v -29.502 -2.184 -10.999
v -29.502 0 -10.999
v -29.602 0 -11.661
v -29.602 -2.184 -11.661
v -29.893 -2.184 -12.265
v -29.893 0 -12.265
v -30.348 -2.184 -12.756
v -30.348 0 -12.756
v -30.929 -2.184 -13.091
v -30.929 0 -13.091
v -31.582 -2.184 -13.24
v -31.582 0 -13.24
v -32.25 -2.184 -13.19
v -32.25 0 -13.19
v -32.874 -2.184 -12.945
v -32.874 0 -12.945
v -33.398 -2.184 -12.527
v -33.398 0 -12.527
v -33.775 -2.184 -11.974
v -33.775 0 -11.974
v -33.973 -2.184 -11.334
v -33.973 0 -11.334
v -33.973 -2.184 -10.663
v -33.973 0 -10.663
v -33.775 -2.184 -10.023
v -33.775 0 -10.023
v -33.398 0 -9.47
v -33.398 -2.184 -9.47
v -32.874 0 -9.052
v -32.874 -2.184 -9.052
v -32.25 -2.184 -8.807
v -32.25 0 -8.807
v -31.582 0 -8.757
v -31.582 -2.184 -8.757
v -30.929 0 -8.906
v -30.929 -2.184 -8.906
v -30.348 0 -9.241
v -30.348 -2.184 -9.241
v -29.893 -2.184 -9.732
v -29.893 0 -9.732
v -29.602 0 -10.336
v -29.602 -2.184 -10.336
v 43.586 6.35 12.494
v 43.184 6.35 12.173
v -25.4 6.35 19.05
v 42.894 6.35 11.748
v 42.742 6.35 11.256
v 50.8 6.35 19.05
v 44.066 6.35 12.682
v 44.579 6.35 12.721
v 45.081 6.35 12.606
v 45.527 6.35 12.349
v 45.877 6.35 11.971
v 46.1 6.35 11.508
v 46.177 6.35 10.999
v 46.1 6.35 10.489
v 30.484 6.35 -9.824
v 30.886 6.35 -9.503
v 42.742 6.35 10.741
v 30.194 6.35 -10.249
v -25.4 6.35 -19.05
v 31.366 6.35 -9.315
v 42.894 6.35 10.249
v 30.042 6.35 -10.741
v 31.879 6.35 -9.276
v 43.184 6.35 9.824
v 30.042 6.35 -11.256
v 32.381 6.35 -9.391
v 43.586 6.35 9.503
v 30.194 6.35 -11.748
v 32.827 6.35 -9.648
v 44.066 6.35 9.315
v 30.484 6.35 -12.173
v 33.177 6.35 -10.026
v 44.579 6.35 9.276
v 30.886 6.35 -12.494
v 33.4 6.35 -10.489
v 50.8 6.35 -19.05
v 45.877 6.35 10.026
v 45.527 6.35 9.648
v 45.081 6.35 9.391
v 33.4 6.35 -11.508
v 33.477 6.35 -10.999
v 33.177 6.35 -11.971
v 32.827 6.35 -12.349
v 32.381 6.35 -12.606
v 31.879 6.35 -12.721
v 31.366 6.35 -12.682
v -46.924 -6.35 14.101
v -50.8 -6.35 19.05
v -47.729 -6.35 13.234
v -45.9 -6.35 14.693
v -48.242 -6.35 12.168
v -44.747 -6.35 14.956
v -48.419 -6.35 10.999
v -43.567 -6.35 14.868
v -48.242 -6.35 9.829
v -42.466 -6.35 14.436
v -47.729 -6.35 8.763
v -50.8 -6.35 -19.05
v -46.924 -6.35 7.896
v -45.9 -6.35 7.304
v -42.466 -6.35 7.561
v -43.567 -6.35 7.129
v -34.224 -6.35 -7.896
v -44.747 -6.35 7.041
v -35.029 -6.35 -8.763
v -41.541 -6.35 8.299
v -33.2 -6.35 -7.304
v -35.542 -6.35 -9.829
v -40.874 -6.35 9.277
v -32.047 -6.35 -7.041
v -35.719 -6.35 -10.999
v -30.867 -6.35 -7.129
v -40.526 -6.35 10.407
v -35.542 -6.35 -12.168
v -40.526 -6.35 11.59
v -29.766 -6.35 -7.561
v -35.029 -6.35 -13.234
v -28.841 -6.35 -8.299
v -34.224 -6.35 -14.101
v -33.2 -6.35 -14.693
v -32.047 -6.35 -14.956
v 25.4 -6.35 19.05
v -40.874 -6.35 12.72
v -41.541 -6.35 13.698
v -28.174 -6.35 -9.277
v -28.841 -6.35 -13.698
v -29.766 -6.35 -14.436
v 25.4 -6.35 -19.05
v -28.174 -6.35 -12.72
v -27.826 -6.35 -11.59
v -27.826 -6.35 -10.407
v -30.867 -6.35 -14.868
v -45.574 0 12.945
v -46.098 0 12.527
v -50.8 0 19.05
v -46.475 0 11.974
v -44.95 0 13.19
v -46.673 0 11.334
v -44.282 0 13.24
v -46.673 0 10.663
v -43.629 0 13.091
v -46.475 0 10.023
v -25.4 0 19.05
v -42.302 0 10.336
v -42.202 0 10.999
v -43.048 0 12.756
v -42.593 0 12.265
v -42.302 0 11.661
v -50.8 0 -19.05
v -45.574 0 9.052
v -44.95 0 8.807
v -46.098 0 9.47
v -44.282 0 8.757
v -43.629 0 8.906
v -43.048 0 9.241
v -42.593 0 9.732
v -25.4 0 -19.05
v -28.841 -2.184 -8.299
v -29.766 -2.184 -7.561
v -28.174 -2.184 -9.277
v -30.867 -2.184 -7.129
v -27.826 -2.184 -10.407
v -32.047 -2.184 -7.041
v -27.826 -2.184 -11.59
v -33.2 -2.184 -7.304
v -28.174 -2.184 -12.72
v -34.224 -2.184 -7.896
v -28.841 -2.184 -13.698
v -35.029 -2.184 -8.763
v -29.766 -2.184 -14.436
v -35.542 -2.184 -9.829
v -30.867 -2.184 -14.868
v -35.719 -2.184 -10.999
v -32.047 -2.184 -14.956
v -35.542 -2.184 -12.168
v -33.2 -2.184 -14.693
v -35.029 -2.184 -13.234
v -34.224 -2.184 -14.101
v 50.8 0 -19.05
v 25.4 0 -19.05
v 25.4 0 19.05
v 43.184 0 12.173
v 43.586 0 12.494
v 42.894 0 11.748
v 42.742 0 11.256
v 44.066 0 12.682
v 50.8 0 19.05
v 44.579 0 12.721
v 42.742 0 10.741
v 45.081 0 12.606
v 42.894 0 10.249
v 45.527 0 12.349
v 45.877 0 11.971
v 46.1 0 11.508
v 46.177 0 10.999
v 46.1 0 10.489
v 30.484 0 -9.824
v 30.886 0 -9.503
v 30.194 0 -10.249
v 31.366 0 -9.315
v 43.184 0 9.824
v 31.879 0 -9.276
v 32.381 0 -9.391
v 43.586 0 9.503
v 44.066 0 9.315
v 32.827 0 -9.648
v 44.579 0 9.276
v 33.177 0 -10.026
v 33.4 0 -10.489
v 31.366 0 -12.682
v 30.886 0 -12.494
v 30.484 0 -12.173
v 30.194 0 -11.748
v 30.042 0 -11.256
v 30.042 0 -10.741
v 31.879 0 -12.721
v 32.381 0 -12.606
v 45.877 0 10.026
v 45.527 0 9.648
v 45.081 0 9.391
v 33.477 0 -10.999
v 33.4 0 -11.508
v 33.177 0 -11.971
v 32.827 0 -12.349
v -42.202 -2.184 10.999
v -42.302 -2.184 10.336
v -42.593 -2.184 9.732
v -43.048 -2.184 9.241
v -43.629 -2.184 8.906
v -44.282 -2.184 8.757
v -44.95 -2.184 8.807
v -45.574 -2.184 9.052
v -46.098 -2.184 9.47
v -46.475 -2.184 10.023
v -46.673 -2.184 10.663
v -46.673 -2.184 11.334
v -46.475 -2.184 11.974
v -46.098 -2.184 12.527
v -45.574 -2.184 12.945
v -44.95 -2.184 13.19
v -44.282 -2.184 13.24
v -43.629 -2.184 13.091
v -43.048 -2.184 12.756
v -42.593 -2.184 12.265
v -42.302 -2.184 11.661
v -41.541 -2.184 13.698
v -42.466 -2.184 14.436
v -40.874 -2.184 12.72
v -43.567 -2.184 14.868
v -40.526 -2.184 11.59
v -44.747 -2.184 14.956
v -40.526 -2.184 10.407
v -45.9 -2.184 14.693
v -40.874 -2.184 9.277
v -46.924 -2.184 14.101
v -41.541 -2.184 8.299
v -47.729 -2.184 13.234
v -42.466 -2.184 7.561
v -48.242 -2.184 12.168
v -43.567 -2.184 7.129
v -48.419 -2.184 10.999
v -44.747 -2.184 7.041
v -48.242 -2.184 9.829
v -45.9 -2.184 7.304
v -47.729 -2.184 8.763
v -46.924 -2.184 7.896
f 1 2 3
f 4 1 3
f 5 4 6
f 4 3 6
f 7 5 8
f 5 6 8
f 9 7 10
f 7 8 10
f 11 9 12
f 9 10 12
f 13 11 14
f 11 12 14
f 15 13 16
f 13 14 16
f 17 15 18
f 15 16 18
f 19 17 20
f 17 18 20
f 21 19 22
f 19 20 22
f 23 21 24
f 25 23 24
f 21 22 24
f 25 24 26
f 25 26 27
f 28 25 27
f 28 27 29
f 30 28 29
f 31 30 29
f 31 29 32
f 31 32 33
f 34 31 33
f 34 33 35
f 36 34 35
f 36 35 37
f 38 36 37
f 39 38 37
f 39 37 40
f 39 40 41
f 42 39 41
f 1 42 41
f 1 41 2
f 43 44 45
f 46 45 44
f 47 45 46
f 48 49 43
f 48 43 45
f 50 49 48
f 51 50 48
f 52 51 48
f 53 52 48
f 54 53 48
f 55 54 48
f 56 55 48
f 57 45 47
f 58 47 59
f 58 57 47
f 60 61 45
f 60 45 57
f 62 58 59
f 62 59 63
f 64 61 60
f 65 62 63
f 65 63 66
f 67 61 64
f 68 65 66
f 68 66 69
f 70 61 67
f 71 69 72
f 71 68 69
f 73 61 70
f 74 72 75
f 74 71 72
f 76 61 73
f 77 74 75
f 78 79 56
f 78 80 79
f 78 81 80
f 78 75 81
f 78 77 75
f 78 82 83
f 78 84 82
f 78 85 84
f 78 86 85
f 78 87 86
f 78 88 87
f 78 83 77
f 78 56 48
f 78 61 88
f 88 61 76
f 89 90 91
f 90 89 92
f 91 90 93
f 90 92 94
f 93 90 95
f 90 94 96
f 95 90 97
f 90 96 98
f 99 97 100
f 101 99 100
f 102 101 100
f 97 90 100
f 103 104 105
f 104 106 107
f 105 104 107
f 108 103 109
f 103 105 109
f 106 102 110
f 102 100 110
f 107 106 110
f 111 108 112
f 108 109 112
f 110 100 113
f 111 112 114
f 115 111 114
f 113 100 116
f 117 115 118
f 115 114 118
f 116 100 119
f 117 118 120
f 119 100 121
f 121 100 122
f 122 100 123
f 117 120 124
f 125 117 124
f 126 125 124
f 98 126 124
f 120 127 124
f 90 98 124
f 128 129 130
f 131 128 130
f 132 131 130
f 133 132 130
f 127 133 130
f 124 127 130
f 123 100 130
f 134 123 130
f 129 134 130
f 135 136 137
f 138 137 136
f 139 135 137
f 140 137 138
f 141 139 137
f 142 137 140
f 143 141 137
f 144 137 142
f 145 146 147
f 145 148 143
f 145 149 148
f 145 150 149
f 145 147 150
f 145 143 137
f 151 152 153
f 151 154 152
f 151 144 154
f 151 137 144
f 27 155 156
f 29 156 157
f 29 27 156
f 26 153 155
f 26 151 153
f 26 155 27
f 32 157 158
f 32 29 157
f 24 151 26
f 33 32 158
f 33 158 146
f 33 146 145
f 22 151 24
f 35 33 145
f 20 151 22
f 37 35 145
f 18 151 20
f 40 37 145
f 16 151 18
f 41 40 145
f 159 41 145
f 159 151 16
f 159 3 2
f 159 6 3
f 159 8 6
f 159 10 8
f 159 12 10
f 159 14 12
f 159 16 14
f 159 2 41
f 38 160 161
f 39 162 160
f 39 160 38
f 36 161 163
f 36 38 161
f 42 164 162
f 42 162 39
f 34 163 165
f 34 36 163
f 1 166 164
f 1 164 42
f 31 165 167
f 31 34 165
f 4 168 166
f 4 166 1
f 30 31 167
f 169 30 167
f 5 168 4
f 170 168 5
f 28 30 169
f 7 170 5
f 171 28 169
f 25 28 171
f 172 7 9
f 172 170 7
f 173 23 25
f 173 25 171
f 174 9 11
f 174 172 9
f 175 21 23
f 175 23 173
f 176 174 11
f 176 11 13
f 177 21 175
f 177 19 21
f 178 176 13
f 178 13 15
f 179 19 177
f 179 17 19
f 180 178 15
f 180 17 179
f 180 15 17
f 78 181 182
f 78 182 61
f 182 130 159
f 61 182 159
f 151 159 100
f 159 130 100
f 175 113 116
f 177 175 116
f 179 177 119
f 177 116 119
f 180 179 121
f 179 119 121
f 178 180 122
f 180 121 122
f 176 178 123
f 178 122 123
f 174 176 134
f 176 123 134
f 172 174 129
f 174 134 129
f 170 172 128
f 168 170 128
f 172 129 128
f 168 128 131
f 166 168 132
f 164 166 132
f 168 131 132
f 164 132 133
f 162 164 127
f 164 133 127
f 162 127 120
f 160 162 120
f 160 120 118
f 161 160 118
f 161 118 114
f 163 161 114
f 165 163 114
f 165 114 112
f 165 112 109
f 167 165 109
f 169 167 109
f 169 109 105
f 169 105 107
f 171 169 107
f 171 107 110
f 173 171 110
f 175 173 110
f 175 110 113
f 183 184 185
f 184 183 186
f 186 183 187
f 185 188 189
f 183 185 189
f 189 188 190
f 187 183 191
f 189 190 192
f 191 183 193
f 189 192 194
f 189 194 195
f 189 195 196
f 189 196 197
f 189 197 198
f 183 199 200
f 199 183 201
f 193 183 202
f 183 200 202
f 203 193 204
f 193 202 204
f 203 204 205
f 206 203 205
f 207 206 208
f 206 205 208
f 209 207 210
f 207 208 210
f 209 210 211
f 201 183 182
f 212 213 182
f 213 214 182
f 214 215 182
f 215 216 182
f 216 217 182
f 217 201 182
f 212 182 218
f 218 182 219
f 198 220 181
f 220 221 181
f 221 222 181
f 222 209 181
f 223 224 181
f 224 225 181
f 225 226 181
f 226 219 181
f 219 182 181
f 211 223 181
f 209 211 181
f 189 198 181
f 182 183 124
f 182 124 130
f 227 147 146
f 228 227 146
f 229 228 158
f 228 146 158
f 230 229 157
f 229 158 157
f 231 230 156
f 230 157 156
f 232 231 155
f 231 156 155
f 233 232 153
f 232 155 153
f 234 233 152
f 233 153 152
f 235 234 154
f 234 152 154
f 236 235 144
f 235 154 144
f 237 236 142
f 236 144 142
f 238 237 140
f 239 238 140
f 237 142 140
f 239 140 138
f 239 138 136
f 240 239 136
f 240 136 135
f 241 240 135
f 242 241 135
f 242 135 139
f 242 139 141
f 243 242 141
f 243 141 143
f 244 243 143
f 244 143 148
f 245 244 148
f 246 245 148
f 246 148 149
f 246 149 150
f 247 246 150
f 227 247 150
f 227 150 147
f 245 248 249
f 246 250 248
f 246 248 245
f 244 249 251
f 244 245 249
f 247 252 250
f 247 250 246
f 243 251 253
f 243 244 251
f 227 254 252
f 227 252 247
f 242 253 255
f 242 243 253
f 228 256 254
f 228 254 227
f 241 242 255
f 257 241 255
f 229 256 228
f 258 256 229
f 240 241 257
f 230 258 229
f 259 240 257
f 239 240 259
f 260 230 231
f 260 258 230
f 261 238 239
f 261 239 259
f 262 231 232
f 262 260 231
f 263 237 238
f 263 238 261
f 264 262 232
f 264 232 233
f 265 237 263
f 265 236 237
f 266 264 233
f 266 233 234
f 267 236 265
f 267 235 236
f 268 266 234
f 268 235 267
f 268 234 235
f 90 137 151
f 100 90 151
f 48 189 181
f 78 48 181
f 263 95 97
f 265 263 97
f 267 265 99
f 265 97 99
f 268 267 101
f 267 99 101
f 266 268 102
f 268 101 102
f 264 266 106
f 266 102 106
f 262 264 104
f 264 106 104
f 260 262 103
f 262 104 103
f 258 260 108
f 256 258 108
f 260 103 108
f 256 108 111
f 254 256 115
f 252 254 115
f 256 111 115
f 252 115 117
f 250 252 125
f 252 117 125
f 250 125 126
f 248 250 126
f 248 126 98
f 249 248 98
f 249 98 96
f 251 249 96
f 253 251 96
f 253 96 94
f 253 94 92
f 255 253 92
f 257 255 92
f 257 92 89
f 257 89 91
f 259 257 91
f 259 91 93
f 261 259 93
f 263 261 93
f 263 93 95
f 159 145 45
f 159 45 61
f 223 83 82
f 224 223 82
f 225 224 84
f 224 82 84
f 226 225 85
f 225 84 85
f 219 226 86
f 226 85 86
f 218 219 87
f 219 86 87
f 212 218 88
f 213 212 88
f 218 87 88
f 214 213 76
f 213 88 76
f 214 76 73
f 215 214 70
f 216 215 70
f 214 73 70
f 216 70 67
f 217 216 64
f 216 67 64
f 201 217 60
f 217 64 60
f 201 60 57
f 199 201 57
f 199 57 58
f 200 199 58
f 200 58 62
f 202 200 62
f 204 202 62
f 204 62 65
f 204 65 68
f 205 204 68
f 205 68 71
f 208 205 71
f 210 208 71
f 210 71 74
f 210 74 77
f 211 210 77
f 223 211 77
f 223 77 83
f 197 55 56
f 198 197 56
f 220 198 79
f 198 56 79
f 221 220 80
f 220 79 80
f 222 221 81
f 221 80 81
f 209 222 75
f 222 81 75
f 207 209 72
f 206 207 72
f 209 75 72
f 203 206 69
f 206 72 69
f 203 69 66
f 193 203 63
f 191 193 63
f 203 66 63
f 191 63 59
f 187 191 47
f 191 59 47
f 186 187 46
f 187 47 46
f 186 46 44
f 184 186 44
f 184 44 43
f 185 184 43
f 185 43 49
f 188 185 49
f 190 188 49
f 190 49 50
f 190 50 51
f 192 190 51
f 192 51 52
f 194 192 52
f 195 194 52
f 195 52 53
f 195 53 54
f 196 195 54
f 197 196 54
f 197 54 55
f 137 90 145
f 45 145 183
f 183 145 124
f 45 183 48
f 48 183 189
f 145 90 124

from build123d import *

# Parameters (mm, degrees)
SKETCH1_W                                      = 25.4
SKETCH1_H                                      = 38.1
SKETCH1_W_2                                    = 50.8
BOSS_EXTRUDE1_DEPTH                            = 6.35
SKETCH1_3_W                                    = 50.8
SKETCH1_3_H                                    = 38.1
SKETCH1_3_W_2                                  = 25.4
BOSS_EXTRUDE2_DEPTH                            = 6.35
CBORE_FOR_8_SOCKET_HEAD_CAP_SCREW1_D           = 4.4958
CBORE_FOR_8_SOCKET_HEAD_CAP_SCREW1_DEPTH       = 6.35
CBORE_FOR_8_SOCKET_HEAD_CAP_SCREW1_CBORE_D     = 7.9375
CBORE_FOR_8_SOCKET_HEAD_CAP_SCREW1_CBORE_DEPTH = 4.1656
F_8_32_TAPPED_HOLE1_D                          = 3.4544


with BuildPart() as part:
    # Sketch1 → Boss-Extrude1 (new body)
    with BuildSketch(Plane(origin=(0, 0, 0), x_dir=(1, 0, 0), z_dir=(0, 1, 0))):
        with Locations((-38.1, 0)):
            Rectangle(SKETCH1_W, SKETCH1_H)
        Rectangle(SKETCH1_W_2, SKETCH1_H)
    extrude(amount=-BOSS_EXTRUDE1_DEPTH)

    # Sketch1<3> → Boss-Extrude2 (add)
    with BuildSketch(Plane(origin=(0, 0, 0), x_dir=(1, 0, 0), z_dir=(0, 1, 0))):
        Rectangle(SKETCH1_3_W, SKETCH1_3_H)
        with Locations((38.1, 0)):
            Rectangle(SKETCH1_3_W_2, SKETCH1_3_H)
    extrude(amount=BOSS_EXTRUDE2_DEPTH)

    # CBORE for #8 Socket Head Cap Screw1
    with Locations(Plane(origin=(0, -6.35, 0), x_dir=(-1, 0, 0), z_dir=(0, -1, 0))):
        with Locations((31.75, 10.998522628), (44.45, -10.998522628)):
            CounterBoreHole(CBORE_FOR_8_SOCKET_HEAD_CAP_SCREW1_D / 2, CBORE_FOR_8_SOCKET_HEAD_CAP_SCREW1_CBORE_D / 2, CBORE_FOR_8_SOCKET_HEAD_CAP_SCREW1_CBORE_DEPTH, depth=CBORE_FOR_8_SOCKET_HEAD_CAP_SCREW1_DEPTH)

    # #8-32 Tapped Hole1 (through all)
    with Locations(Plane(origin=(0, 0, 0), x_dir=(-1, 0, 0), z_dir=(0, -1, 0))):
        with Locations((-31.75, 10.998522628), (-44.45, -10.998522628)):
            Hole(F_8_32_TAPPED_HOLE1_D / 2)


solid = part.part
